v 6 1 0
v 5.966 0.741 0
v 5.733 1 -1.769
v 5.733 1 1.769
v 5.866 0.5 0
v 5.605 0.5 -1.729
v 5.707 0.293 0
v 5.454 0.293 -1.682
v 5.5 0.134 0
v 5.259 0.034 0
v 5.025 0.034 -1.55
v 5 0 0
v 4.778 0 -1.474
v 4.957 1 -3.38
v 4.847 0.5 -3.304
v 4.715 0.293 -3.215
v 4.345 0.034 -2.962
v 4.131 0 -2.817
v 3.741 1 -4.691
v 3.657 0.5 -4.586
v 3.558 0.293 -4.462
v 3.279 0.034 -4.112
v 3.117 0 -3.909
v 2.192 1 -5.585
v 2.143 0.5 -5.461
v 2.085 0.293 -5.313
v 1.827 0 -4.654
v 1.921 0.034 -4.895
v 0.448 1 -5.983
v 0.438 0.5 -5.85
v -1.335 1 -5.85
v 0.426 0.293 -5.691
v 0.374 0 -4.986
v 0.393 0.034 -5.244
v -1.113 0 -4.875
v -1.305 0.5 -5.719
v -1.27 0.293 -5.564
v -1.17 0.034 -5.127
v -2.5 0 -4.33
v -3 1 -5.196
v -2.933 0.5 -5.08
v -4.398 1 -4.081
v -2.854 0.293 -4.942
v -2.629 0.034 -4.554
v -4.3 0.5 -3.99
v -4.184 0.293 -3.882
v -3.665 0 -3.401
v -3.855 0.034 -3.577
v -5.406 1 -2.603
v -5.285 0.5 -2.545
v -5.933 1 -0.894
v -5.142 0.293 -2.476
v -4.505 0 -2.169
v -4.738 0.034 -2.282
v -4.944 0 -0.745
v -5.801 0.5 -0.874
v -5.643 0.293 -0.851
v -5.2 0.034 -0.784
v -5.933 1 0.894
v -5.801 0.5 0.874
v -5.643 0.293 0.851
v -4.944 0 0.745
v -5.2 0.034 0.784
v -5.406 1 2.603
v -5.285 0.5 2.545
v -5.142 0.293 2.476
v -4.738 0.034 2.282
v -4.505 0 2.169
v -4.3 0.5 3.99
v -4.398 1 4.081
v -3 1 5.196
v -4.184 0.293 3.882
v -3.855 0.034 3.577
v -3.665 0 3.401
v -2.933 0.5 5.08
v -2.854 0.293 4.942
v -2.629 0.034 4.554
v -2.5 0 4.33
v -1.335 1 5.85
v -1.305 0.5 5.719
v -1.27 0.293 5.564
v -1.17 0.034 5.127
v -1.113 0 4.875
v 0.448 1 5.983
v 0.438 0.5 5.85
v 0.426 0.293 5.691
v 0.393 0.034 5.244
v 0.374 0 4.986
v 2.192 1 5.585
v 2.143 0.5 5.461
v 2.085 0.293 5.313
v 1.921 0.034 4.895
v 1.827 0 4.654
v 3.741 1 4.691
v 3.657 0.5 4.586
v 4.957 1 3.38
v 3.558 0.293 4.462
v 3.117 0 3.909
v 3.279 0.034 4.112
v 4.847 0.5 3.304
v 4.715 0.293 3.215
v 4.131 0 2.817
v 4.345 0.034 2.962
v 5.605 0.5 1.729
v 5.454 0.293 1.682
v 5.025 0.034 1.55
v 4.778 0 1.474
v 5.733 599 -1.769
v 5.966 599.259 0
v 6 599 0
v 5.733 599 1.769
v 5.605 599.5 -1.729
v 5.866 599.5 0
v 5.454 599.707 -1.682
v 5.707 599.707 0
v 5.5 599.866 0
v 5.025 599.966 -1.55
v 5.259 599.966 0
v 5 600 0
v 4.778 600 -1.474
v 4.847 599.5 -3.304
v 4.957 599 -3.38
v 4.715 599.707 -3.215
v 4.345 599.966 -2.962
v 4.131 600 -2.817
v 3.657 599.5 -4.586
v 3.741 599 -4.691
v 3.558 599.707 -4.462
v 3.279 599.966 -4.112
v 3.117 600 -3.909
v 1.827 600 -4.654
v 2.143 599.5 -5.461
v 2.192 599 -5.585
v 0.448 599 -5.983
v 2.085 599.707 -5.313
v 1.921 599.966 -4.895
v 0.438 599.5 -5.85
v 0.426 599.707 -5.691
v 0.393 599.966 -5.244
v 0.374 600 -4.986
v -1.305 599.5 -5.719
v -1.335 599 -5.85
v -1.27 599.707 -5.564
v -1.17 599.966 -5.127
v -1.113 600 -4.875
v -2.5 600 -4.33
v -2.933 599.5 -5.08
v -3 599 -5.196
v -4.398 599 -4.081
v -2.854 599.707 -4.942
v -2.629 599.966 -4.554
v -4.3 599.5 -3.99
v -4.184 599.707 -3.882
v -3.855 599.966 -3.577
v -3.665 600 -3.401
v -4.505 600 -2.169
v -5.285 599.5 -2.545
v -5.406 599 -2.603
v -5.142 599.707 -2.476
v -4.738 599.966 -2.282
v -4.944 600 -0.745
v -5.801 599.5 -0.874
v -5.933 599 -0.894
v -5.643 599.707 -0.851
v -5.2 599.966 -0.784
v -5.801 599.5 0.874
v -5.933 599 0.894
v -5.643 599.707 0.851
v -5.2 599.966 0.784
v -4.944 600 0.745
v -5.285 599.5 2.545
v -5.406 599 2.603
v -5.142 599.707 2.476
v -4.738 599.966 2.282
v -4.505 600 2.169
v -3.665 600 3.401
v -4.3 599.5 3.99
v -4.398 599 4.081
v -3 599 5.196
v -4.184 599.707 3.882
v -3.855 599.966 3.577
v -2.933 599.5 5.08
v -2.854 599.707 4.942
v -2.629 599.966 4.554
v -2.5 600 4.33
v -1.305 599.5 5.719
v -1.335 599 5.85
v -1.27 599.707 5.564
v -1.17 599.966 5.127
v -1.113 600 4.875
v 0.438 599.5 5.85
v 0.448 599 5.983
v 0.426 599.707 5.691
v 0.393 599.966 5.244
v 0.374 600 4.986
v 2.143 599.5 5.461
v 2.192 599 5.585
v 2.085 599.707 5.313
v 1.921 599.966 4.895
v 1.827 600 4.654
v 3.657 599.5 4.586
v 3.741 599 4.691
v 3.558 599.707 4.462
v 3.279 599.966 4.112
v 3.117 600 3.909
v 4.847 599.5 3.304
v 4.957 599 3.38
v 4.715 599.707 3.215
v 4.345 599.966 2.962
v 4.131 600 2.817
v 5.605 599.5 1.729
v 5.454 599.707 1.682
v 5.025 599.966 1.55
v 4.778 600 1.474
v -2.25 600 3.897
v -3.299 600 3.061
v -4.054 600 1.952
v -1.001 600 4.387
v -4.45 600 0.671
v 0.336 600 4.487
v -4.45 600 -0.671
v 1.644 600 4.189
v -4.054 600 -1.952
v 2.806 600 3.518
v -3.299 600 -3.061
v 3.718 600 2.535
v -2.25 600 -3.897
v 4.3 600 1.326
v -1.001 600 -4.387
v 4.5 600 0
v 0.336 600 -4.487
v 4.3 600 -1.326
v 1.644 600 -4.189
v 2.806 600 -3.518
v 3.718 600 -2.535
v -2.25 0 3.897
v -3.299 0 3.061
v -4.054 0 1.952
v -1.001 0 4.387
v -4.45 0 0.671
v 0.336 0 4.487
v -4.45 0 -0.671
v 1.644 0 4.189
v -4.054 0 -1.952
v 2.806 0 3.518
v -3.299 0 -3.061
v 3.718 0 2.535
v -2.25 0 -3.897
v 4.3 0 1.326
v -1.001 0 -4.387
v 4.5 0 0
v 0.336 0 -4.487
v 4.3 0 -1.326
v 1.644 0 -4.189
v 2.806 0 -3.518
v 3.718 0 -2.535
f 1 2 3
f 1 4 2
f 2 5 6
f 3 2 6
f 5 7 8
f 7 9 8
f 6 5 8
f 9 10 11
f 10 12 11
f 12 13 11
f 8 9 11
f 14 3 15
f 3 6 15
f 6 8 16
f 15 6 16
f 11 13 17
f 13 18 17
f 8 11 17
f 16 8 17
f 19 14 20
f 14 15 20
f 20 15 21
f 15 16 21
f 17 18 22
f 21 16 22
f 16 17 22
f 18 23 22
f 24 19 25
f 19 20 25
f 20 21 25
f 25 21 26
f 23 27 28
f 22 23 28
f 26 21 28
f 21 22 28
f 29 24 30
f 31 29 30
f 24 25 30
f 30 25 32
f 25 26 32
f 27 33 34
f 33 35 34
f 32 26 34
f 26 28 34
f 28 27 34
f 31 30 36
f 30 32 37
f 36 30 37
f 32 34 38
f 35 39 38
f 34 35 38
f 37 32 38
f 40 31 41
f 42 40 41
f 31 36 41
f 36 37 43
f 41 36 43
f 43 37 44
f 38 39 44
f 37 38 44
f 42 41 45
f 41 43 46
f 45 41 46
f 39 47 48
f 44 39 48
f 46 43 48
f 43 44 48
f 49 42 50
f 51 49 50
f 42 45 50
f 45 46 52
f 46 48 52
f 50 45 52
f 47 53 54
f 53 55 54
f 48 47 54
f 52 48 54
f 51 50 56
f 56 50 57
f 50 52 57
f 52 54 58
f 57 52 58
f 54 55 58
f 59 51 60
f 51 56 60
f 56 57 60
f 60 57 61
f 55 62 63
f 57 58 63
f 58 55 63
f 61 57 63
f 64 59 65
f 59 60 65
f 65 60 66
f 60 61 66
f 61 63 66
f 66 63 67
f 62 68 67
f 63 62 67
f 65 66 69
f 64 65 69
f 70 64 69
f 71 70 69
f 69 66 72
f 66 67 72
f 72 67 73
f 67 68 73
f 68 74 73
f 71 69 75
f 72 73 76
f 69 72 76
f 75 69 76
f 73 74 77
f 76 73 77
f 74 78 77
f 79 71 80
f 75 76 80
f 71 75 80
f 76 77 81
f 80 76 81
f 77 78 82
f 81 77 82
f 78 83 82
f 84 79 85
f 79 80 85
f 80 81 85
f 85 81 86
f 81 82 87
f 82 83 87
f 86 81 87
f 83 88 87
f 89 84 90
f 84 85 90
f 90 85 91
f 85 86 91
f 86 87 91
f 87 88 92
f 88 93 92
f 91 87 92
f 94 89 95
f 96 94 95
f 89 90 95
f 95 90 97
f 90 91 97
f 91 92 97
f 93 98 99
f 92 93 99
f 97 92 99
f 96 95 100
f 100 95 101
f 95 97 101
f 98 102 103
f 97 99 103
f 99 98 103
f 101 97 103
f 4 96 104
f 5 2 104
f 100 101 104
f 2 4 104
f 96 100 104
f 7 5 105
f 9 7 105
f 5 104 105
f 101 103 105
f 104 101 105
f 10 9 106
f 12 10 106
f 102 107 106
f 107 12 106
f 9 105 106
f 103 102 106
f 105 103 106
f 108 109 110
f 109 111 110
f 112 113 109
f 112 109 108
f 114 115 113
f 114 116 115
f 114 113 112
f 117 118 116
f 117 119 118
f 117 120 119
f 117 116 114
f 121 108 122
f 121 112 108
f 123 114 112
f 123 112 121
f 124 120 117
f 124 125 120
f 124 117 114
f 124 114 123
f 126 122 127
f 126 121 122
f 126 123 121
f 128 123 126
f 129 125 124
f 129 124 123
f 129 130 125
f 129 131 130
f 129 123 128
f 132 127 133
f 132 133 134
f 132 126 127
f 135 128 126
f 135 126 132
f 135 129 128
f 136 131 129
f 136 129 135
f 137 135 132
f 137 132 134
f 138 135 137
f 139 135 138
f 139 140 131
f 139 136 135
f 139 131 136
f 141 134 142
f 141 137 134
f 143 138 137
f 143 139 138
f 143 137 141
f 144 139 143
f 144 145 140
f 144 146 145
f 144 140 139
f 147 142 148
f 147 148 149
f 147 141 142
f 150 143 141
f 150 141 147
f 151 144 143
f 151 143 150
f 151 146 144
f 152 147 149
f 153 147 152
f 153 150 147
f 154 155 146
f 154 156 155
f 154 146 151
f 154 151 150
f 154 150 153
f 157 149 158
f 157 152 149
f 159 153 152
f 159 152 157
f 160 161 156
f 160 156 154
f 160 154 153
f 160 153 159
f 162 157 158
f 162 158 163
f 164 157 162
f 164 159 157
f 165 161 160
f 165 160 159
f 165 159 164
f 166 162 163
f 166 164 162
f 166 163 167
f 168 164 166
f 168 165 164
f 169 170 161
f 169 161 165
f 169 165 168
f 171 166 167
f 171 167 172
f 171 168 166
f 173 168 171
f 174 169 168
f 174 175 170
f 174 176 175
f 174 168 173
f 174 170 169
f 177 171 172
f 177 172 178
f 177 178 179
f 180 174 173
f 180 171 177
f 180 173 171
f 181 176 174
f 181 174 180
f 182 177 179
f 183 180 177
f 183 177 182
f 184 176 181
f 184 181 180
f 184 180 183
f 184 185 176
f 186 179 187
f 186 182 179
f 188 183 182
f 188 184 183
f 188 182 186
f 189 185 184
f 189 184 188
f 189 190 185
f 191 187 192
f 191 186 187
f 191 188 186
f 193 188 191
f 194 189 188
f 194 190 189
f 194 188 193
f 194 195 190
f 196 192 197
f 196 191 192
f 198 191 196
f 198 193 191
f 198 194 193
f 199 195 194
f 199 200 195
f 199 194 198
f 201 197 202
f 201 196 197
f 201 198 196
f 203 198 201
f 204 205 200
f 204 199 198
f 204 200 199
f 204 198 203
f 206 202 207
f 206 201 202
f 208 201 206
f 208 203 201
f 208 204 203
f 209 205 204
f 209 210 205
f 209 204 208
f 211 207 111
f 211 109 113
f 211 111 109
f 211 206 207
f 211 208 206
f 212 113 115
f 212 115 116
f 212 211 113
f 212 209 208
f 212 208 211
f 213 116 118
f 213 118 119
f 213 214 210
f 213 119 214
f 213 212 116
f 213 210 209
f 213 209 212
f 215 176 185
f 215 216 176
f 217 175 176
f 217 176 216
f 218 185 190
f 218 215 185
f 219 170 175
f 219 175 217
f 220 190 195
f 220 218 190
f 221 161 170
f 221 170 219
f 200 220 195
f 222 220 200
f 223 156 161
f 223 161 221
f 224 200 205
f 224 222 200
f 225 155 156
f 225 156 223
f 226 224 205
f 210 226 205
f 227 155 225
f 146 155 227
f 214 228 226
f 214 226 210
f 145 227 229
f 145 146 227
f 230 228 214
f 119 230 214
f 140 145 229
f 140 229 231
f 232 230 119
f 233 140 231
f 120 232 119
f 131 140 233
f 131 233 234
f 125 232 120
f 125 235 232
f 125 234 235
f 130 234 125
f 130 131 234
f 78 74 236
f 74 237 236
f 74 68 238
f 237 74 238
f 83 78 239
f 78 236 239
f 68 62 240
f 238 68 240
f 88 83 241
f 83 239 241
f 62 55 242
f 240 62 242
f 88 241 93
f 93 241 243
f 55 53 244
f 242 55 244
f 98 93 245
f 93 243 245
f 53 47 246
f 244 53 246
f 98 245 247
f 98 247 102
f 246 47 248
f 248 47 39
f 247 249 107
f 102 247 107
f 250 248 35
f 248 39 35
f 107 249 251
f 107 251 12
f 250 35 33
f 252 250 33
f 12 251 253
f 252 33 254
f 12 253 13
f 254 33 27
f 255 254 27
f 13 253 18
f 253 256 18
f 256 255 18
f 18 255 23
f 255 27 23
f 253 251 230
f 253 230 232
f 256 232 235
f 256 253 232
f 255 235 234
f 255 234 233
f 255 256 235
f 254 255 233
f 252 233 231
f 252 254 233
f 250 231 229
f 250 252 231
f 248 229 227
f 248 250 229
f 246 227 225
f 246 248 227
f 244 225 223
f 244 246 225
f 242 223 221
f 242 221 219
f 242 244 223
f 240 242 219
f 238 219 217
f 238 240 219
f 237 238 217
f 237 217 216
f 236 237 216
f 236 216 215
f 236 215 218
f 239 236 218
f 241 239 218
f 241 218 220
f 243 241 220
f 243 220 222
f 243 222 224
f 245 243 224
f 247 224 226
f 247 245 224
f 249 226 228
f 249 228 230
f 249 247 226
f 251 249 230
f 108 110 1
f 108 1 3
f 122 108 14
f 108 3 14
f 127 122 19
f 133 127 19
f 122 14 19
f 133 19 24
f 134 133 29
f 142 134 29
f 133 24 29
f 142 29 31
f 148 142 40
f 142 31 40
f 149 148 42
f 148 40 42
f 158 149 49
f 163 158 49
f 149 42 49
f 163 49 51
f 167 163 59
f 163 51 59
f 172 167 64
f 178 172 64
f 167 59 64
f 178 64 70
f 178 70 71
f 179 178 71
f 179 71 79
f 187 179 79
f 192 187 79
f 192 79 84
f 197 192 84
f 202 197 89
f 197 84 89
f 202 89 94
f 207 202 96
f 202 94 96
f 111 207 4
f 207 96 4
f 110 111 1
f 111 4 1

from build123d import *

# Parameters (mm, degrees)
SKETCH1_R           = 6
SKETCH1_R_2         = 4.5
BOSS_EXTRUDE1_DEPTH = 600
FILLET3_R           = 1
FILLET4_R           = 1


with BuildPart() as part:
    # Sketch1 → Boss-Extrude1 (new body)
    with BuildSketch(Plane(origin=(0, 0, 0), x_dir=(1, 0, 0), z_dir=(0, 1, 0))):
        Circle(SKETCH1_R)
        Circle(SKETCH1_R_2, mode=Mode.SUBTRACT)
    extrude(amount=BOSS_EXTRUDE1_DEPTH)

    # Fillet3
    fillet3_edges = [part.edges().sort_by_distance(p)[0] for p in [
        (-6, 0, 0),
    ]]
    fillet(fillet3_edges, radius=FILLET3_R)

    # Fillet4
    fillet4_edges = [part.edges().sort_by_distance(p)[0] for p in [
        (-6, 600, 0),
    ]]
    fillet(fillet4_edges, radius=FILLET4_R)


solid = part.part
